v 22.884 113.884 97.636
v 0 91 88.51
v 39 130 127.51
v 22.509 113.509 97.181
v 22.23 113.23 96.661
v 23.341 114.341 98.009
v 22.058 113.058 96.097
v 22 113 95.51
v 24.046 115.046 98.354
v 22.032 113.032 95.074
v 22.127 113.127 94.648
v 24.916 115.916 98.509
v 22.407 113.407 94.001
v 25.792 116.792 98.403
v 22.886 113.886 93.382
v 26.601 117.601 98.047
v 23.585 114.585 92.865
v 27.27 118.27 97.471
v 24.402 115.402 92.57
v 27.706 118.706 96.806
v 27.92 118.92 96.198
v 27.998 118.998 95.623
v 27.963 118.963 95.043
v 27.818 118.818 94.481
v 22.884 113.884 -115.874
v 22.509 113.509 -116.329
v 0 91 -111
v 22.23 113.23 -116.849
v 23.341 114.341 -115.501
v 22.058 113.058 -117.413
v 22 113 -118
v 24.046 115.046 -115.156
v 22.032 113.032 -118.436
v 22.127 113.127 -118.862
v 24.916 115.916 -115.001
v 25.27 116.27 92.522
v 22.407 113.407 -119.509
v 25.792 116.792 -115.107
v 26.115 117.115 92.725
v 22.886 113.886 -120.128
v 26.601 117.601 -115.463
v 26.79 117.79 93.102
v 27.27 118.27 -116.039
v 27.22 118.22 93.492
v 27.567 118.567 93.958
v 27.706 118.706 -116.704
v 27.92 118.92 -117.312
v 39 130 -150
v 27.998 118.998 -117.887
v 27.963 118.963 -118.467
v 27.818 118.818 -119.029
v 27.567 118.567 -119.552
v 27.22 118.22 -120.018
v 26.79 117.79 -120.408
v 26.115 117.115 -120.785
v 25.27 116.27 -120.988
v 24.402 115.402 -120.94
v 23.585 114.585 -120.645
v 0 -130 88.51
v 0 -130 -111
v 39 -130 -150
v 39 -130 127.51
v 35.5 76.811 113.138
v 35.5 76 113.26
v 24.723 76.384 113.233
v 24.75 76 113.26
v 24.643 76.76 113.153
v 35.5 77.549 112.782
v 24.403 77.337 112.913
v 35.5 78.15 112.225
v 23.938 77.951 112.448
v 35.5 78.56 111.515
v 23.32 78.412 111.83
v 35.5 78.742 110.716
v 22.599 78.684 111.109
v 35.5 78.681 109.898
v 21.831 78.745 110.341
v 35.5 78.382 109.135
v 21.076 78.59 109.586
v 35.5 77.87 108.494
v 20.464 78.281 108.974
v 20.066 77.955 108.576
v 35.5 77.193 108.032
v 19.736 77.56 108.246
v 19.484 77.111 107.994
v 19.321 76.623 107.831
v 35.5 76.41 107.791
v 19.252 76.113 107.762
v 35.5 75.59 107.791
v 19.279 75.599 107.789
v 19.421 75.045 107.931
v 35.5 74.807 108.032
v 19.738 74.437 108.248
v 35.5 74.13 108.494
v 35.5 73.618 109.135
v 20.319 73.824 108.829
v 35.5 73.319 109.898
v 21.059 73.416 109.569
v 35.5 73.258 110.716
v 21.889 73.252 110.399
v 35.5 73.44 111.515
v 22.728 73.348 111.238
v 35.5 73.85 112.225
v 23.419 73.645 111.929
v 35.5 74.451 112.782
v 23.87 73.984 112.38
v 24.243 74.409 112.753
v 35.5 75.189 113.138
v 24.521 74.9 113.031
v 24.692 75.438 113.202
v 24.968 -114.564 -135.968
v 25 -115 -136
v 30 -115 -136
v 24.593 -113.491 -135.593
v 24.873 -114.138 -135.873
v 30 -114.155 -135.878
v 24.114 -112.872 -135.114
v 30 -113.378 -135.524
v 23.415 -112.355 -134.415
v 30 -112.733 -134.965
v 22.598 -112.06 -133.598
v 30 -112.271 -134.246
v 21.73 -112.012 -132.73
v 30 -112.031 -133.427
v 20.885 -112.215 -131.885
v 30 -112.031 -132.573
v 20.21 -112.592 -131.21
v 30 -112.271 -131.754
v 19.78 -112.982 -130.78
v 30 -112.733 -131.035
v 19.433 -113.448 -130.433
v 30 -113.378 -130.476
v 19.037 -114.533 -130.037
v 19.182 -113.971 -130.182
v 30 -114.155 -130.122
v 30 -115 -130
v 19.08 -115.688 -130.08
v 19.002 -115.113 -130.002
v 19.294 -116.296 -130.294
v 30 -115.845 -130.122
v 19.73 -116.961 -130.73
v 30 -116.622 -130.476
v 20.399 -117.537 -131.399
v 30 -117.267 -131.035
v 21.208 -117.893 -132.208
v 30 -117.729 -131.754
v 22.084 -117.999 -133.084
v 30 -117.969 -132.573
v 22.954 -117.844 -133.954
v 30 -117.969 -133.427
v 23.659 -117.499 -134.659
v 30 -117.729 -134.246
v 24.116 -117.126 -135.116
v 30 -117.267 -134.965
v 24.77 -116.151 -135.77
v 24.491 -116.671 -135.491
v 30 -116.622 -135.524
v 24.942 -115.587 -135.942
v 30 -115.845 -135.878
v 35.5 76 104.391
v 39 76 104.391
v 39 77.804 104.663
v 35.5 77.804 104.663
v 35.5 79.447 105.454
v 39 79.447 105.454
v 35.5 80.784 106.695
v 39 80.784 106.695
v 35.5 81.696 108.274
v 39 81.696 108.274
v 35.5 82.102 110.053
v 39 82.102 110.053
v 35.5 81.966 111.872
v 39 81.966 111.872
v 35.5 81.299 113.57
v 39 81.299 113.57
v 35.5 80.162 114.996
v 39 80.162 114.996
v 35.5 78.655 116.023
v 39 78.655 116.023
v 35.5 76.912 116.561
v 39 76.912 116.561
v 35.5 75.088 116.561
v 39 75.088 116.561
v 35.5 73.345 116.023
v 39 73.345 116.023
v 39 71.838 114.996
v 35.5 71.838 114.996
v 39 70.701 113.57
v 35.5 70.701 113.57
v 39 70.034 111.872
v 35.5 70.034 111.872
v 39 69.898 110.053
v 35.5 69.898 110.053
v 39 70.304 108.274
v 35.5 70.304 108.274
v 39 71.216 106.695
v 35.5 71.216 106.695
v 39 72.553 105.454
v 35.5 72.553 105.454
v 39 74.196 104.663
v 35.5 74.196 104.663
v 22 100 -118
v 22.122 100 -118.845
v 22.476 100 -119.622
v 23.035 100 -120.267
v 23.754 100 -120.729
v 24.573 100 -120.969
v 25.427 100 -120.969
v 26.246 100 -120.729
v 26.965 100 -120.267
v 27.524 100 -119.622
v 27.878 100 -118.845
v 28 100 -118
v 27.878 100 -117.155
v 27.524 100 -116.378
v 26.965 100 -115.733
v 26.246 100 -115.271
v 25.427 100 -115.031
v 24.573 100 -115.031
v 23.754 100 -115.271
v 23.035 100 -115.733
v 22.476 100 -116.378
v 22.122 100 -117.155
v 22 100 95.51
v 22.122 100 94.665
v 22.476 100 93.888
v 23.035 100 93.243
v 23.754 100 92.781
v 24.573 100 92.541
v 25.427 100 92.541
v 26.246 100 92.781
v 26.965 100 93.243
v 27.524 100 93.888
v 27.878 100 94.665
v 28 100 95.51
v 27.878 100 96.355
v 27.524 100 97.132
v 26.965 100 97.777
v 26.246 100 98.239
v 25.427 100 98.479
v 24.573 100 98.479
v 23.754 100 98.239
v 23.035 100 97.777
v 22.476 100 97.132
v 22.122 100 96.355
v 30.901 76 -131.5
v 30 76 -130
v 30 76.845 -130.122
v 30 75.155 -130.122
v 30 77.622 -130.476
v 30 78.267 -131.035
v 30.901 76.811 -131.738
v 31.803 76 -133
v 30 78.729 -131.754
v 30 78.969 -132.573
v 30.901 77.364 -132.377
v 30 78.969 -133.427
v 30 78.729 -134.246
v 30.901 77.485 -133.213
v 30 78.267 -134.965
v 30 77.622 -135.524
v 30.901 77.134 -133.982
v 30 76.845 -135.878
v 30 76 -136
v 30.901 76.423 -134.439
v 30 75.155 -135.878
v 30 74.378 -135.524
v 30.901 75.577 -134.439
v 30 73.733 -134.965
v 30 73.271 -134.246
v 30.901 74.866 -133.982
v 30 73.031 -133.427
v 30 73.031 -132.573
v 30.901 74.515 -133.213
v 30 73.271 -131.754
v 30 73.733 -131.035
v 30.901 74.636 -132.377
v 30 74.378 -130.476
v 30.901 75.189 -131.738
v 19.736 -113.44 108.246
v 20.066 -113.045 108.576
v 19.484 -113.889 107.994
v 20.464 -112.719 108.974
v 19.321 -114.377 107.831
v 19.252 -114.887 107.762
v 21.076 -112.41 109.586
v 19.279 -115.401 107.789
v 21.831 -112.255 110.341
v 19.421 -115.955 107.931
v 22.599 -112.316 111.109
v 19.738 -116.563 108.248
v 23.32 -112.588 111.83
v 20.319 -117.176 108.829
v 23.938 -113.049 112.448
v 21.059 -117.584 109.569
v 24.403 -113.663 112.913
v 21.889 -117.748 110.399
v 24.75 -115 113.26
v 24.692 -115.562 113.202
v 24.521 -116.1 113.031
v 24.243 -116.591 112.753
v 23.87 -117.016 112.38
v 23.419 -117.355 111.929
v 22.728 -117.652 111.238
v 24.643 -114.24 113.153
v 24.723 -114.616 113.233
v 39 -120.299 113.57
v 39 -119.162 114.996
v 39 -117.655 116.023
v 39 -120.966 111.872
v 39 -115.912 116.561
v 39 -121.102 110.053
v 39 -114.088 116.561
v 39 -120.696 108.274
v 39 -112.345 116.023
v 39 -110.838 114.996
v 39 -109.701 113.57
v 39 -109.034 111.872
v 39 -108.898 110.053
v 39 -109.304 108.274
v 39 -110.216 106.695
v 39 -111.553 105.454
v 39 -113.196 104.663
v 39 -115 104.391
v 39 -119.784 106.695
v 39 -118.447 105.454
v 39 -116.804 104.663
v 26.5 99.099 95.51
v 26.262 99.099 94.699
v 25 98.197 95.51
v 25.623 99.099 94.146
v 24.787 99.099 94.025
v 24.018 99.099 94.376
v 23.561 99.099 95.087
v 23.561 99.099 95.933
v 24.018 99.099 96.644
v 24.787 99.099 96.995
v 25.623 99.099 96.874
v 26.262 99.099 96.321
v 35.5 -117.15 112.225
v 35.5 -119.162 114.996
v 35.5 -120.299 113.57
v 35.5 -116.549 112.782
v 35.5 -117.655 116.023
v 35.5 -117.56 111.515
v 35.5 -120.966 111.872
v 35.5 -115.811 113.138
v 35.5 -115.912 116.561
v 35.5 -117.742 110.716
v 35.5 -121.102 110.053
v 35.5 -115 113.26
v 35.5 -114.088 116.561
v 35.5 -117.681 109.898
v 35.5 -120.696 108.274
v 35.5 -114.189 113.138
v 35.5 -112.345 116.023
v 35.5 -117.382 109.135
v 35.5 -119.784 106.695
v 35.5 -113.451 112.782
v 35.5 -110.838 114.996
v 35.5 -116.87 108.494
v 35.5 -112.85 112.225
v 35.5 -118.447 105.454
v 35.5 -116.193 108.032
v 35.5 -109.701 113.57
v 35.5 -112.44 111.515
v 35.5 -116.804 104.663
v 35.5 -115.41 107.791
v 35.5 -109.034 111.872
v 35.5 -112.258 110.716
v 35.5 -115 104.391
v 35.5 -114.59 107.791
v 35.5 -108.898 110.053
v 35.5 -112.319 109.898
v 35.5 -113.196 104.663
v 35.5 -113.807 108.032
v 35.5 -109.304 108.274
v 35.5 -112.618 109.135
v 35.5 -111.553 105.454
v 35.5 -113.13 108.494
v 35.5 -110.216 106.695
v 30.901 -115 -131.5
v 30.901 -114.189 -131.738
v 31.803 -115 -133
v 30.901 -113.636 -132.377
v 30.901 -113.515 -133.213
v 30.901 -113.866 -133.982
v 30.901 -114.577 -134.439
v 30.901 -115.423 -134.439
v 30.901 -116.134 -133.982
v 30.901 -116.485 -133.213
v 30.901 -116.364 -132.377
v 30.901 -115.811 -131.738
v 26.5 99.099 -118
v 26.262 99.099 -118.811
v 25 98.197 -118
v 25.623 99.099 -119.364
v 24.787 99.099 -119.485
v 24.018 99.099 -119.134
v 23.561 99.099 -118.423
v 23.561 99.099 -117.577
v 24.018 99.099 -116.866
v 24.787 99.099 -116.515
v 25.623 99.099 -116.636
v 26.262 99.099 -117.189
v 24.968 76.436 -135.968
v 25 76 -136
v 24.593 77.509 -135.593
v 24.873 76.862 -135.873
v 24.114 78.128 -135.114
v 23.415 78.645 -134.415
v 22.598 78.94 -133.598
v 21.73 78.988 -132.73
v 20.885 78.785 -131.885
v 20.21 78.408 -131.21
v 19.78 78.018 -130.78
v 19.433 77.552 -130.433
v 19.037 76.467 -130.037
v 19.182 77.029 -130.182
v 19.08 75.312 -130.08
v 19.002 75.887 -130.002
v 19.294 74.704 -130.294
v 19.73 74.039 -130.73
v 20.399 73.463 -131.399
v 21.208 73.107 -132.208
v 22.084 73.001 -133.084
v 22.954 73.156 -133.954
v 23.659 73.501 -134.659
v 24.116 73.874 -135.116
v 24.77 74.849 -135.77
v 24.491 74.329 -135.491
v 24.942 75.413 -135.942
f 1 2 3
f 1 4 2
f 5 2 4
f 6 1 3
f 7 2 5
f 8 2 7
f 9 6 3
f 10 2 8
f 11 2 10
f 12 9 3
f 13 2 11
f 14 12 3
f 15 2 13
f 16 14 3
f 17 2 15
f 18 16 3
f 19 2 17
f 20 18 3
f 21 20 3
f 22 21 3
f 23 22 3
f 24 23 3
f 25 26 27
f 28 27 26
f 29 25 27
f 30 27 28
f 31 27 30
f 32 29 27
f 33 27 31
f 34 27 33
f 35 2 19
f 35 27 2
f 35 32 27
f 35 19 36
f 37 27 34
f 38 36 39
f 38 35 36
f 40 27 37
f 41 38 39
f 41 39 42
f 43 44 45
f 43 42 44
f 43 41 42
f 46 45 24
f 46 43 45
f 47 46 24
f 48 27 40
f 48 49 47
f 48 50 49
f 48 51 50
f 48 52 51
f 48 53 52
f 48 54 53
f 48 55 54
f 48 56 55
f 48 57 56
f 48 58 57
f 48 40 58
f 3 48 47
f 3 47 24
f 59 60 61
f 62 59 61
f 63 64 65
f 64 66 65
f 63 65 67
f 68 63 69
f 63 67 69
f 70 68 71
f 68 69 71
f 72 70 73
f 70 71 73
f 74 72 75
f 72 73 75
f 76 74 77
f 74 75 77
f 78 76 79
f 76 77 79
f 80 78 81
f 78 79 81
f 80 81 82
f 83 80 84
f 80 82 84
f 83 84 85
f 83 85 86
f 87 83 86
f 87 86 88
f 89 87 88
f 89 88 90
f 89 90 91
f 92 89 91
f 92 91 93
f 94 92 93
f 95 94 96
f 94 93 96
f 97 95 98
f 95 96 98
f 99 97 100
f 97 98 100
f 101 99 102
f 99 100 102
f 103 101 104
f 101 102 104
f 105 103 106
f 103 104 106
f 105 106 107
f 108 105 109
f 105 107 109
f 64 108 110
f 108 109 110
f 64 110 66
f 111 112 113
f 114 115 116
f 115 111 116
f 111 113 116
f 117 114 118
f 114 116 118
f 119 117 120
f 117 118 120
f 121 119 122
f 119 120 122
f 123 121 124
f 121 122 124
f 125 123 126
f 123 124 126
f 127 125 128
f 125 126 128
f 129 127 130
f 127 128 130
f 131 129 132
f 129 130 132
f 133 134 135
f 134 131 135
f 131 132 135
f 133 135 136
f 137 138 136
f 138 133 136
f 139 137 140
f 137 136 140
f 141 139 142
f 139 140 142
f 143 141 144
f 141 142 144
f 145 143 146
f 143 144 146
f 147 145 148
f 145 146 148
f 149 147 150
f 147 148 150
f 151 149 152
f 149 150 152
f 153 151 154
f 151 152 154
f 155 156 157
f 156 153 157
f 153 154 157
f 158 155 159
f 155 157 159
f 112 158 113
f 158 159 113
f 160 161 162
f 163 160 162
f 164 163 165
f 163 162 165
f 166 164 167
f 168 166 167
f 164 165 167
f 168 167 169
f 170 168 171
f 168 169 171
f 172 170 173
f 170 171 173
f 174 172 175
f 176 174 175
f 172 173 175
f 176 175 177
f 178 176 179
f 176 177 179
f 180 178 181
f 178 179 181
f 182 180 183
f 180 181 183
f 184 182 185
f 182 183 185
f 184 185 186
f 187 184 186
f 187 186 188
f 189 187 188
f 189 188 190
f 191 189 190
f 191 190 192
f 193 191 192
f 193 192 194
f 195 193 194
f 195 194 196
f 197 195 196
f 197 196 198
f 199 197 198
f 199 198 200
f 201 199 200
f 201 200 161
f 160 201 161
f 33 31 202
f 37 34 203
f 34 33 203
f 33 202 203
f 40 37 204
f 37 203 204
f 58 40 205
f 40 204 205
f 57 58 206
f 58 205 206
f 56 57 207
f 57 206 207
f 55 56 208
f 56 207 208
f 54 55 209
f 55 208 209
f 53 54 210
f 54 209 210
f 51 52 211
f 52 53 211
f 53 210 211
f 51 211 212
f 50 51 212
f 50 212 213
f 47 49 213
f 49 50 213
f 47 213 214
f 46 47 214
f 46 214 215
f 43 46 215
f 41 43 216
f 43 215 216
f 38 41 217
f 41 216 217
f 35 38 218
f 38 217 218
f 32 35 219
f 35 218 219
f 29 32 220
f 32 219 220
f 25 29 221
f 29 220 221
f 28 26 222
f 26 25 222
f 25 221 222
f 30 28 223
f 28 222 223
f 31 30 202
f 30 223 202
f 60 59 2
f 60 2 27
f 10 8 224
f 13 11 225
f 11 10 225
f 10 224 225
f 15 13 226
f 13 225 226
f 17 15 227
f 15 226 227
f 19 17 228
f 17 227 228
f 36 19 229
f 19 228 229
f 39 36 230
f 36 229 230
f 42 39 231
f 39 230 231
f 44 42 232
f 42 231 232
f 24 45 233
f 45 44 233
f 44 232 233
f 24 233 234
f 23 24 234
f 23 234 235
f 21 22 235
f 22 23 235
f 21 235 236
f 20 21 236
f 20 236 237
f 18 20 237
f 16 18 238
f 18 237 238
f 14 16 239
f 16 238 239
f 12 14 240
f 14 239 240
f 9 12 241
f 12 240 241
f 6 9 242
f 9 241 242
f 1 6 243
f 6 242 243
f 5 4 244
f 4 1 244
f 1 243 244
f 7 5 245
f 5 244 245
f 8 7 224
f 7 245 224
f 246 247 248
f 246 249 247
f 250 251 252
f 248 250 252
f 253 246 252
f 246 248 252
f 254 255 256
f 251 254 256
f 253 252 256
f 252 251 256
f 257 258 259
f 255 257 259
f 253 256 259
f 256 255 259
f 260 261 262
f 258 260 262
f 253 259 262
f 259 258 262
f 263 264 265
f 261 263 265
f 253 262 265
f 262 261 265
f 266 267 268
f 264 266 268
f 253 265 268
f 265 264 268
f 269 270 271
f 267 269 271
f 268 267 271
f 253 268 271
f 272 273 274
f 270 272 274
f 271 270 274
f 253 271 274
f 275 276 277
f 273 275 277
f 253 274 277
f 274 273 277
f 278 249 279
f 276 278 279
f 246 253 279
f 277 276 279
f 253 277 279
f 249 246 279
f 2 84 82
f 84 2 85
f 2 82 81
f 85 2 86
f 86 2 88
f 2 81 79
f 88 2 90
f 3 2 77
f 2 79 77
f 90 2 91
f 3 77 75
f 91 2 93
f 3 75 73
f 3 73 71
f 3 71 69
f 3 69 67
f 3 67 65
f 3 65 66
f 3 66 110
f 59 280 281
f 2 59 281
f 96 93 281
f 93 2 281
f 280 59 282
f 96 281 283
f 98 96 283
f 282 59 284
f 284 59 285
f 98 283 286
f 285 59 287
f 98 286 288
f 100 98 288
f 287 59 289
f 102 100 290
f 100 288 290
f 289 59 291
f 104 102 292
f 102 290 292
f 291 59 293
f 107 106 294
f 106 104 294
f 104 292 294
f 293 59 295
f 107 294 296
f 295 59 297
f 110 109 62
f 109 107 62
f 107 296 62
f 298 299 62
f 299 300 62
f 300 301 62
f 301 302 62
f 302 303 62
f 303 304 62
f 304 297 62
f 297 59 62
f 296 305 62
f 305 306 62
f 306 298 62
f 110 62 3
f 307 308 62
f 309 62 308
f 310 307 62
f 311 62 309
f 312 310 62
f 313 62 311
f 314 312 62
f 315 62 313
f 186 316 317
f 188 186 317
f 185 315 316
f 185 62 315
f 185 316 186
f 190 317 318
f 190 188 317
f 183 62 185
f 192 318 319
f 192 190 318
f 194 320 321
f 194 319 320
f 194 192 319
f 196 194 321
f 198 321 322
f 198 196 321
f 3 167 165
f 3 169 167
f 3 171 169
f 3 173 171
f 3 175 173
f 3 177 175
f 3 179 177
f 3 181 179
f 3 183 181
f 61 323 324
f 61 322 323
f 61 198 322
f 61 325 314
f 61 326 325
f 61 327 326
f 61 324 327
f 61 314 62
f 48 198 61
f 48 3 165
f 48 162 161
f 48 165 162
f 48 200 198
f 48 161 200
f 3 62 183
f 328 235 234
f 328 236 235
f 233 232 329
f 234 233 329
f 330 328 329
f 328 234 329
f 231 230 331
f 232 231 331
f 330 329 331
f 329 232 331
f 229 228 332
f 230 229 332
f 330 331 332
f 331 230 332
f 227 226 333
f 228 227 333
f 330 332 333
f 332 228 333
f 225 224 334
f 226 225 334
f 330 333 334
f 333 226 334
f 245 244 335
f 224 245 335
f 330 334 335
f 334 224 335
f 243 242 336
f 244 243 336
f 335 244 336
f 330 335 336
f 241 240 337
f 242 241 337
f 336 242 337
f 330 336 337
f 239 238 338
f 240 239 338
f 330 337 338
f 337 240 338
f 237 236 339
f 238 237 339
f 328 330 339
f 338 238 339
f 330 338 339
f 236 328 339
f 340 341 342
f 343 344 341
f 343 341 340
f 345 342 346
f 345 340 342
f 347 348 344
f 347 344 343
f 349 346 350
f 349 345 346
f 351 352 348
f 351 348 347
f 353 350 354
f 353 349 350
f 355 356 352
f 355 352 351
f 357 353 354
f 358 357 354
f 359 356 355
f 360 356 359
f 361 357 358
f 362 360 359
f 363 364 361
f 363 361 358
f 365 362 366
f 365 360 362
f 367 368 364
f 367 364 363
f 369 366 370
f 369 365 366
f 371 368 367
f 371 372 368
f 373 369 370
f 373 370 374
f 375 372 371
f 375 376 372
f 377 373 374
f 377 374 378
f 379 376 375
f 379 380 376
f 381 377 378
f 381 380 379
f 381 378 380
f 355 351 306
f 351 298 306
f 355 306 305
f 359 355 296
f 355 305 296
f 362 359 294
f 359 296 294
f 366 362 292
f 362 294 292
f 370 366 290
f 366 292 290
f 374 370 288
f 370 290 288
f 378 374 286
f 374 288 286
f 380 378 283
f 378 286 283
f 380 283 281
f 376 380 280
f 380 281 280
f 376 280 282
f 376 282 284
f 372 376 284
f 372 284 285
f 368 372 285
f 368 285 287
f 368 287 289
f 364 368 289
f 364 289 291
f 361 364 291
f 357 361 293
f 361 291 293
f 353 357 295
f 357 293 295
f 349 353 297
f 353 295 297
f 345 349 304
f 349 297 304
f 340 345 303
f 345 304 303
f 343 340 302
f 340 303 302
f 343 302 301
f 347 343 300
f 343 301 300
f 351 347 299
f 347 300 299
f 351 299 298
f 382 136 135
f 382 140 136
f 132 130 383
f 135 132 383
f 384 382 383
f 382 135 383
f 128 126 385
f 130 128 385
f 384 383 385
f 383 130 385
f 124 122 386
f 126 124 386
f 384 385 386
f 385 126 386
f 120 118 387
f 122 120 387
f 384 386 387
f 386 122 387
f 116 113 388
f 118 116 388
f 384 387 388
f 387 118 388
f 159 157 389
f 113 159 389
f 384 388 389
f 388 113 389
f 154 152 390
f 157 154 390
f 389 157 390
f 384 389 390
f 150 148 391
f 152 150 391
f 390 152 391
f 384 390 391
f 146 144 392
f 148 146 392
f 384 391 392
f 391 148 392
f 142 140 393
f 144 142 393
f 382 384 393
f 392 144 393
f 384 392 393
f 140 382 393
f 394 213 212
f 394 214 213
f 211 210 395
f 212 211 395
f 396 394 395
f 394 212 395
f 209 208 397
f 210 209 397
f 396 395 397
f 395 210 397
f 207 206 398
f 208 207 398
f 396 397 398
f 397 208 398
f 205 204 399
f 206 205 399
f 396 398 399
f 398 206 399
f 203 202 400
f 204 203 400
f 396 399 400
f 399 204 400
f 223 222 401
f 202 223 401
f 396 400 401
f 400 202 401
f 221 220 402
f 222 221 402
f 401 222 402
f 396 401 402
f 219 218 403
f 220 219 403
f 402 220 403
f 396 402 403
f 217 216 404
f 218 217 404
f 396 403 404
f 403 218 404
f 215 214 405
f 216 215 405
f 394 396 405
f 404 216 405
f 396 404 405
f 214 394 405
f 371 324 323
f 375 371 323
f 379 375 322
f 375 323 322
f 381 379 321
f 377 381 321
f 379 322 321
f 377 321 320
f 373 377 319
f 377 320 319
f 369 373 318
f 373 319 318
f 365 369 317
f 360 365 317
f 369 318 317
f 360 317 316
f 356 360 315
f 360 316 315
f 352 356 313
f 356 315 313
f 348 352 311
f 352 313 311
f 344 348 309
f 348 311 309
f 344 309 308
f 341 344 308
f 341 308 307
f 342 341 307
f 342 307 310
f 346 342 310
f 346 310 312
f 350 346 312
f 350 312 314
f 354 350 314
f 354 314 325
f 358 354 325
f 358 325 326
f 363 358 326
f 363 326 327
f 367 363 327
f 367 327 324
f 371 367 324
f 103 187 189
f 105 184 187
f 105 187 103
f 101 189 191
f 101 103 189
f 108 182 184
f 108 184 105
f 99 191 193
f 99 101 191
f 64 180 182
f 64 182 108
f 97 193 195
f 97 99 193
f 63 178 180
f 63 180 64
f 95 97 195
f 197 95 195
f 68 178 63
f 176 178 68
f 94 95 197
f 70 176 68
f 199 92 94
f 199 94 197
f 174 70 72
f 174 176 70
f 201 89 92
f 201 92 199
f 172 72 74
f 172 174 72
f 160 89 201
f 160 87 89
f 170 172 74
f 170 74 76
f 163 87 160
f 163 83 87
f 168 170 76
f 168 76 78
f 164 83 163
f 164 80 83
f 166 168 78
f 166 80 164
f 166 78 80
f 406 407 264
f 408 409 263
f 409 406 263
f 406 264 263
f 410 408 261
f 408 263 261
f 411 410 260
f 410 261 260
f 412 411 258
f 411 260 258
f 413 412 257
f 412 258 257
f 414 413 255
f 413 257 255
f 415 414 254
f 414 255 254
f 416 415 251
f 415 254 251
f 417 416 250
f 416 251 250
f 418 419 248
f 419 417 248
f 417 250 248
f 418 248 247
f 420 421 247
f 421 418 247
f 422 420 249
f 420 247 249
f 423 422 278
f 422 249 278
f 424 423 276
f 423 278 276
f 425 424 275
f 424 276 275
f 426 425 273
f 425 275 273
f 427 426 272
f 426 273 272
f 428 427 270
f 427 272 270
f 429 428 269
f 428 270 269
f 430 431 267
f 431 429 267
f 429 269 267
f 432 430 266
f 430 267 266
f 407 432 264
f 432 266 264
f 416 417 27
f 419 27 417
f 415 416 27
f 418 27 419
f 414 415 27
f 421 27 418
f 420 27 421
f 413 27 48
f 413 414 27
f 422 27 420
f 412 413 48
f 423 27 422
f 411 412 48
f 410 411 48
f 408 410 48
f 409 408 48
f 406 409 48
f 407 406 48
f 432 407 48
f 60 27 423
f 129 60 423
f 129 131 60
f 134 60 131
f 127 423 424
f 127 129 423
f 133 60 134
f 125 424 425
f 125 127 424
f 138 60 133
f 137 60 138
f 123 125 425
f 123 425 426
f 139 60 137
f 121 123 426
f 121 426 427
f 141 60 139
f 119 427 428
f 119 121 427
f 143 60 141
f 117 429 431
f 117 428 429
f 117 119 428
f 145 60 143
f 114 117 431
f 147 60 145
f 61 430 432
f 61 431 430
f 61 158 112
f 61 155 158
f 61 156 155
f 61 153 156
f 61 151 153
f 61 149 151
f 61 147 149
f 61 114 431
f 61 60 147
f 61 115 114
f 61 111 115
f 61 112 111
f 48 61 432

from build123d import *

# Parameters (mm, degrees)
SKETCH1_W                               = 300
SKETCH1_H                               = 260
BOSS_EXTRUDE1_DEPTH                     = 39
CUT_EXTRUDE1_DEPTH                      = 260
CUT_EXTRUDE2_DEPTH                      = 384
F_6_0MM_DOWEL_HOLE1_D                   = 6
F_6_0MM_DOWEL_HOLE1_DEPTH               = 30
F_6_0MM_DOWEL_HOLE1_TIP                 = 1.802581857
CBORE_FOR_M5_HEX_HEAD_BOLT1_D           = 5.5
CBORE_FOR_M5_HEX_HEAD_BOLT1_DEPTH       = 30
CBORE_FOR_M5_HEX_HEAD_BOLT1_CBORE_D     = 12.238
CBORE_FOR_M5_HEX_HEAD_BOLT1_CBORE_DEPTH = 3.5
CBORE_FOR_M5_HEX_HEAD_BOLT1_TIP         = 1.652366702
F_6_0MM_DOWEL_HOLE2_D                   = 6
F_6_0MM_DOWEL_HOLE2_DEPTH               = 30
F_6_0MM_DOWEL_HOLE2_TIP                 = 1.802581857


with BuildPart() as part:
    # Sketch1 → Boss-Extrude1 (new body)
    with BuildSketch(Plane(origin=(0, 0, 0), x_dir=(0, 0, -1), z_dir=(1, 0, 0))):
        Rectangle(SKETCH1_W, SKETCH1_H)
    extrude(amount=BOSS_EXTRUDE1_DEPTH)

    # Sketch3 → Cut-Extrude1 (cut)
    with BuildSketch(Plane(origin=(0, -130, 0), x_dir=(-1, 0, 0), z_dir=(0, -1, 0))):
        Polygon((-39, 150), (0, 150), (0, 111), align=None)
        Polygon((0, -127.51), (0, -88.51), (-39, -127.51), (-39, -150), (0, -150), align=None)
    extrude(amount=-CUT_EXTRUDE1_DEPTH, mode=Mode.SUBTRACT)

    # Sketch5 → Cut-Extrude2 (cut)
    with BuildSketch(Plane(origin=(0, 0, -150), x_dir=(-1, 0, 0), z_dir=(0, 0, -1))):
        Polygon((-39, 130), (0, 130), (0, 91), align=None)
    extrude(amount=-CUT_EXTRUDE2_DEPTH, mode=Mode.SUBTRACT)

    # Ø6.0mm Dowel Hole1
    with Locations(Plane.ZY):
        with Locations((-133, -115), (-133, 76)):
            Hole(F_6_0MM_DOWEL_HOLE1_D / 2, depth=F_6_0MM_DOWEL_HOLE1_DEPTH)
            with Locations((0, 0, -(F_6_0MM_DOWEL_HOLE1_DEPTH + F_6_0MM_DOWEL_HOLE1_TIP / 2))):  # 118° drill point
                Cone(0, F_6_0MM_DOWEL_HOLE1_D / 2, F_6_0MM_DOWEL_HOLE1_TIP, mode=Mode.SUBTRACT)

    # CBORE for M5 Hex Head Bolt1
    with Locations(Plane(origin=(39, 0, 0), x_dir=(0, 0, -1), z_dir=(1, 0, 0))):
        with Locations((-110.51, -115), (-110.51, 76)):
            CounterBoreHole(CBORE_FOR_M5_HEX_HEAD_BOLT1_D / 2, CBORE_FOR_M5_HEX_HEAD_BOLT1_CBORE_D / 2, CBORE_FOR_M5_HEX_HEAD_BOLT1_CBORE_DEPTH, depth=CBORE_FOR_M5_HEX_HEAD_BOLT1_DEPTH)
            with Locations((0, 0, -(CBORE_FOR_M5_HEX_HEAD_BOLT1_DEPTH + CBORE_FOR_M5_HEX_HEAD_BOLT1_TIP / 2))):  # 118° drill point
                Cone(0, CBORE_FOR_M5_HEX_HEAD_BOLT1_D / 2, CBORE_FOR_M5_HEX_HEAD_BOLT1_TIP, mode=Mode.SUBTRACT)

    # Ø6.0mm Dowel Hole2
    with Locations(Plane(origin=(0, 130, 0), x_dir=(1, 0, 0), z_dir=(0, 1, 0))):
        with Locations((25, -95.51), (25, 118)):
            Hole(F_6_0MM_DOWEL_HOLE2_D / 2, depth=F_6_0MM_DOWEL_HOLE2_DEPTH)
            with Locations((0, 0, -(F_6_0MM_DOWEL_HOLE2_DEPTH + F_6_0MM_DOWEL_HOLE2_TIP / 2))):  # 118° drill point
                Cone(0, F_6_0MM_DOWEL_HOLE2_D / 2, F_6_0MM_DOWEL_HOLE2_TIP, mode=Mode.SUBTRACT)


solid = part.part
